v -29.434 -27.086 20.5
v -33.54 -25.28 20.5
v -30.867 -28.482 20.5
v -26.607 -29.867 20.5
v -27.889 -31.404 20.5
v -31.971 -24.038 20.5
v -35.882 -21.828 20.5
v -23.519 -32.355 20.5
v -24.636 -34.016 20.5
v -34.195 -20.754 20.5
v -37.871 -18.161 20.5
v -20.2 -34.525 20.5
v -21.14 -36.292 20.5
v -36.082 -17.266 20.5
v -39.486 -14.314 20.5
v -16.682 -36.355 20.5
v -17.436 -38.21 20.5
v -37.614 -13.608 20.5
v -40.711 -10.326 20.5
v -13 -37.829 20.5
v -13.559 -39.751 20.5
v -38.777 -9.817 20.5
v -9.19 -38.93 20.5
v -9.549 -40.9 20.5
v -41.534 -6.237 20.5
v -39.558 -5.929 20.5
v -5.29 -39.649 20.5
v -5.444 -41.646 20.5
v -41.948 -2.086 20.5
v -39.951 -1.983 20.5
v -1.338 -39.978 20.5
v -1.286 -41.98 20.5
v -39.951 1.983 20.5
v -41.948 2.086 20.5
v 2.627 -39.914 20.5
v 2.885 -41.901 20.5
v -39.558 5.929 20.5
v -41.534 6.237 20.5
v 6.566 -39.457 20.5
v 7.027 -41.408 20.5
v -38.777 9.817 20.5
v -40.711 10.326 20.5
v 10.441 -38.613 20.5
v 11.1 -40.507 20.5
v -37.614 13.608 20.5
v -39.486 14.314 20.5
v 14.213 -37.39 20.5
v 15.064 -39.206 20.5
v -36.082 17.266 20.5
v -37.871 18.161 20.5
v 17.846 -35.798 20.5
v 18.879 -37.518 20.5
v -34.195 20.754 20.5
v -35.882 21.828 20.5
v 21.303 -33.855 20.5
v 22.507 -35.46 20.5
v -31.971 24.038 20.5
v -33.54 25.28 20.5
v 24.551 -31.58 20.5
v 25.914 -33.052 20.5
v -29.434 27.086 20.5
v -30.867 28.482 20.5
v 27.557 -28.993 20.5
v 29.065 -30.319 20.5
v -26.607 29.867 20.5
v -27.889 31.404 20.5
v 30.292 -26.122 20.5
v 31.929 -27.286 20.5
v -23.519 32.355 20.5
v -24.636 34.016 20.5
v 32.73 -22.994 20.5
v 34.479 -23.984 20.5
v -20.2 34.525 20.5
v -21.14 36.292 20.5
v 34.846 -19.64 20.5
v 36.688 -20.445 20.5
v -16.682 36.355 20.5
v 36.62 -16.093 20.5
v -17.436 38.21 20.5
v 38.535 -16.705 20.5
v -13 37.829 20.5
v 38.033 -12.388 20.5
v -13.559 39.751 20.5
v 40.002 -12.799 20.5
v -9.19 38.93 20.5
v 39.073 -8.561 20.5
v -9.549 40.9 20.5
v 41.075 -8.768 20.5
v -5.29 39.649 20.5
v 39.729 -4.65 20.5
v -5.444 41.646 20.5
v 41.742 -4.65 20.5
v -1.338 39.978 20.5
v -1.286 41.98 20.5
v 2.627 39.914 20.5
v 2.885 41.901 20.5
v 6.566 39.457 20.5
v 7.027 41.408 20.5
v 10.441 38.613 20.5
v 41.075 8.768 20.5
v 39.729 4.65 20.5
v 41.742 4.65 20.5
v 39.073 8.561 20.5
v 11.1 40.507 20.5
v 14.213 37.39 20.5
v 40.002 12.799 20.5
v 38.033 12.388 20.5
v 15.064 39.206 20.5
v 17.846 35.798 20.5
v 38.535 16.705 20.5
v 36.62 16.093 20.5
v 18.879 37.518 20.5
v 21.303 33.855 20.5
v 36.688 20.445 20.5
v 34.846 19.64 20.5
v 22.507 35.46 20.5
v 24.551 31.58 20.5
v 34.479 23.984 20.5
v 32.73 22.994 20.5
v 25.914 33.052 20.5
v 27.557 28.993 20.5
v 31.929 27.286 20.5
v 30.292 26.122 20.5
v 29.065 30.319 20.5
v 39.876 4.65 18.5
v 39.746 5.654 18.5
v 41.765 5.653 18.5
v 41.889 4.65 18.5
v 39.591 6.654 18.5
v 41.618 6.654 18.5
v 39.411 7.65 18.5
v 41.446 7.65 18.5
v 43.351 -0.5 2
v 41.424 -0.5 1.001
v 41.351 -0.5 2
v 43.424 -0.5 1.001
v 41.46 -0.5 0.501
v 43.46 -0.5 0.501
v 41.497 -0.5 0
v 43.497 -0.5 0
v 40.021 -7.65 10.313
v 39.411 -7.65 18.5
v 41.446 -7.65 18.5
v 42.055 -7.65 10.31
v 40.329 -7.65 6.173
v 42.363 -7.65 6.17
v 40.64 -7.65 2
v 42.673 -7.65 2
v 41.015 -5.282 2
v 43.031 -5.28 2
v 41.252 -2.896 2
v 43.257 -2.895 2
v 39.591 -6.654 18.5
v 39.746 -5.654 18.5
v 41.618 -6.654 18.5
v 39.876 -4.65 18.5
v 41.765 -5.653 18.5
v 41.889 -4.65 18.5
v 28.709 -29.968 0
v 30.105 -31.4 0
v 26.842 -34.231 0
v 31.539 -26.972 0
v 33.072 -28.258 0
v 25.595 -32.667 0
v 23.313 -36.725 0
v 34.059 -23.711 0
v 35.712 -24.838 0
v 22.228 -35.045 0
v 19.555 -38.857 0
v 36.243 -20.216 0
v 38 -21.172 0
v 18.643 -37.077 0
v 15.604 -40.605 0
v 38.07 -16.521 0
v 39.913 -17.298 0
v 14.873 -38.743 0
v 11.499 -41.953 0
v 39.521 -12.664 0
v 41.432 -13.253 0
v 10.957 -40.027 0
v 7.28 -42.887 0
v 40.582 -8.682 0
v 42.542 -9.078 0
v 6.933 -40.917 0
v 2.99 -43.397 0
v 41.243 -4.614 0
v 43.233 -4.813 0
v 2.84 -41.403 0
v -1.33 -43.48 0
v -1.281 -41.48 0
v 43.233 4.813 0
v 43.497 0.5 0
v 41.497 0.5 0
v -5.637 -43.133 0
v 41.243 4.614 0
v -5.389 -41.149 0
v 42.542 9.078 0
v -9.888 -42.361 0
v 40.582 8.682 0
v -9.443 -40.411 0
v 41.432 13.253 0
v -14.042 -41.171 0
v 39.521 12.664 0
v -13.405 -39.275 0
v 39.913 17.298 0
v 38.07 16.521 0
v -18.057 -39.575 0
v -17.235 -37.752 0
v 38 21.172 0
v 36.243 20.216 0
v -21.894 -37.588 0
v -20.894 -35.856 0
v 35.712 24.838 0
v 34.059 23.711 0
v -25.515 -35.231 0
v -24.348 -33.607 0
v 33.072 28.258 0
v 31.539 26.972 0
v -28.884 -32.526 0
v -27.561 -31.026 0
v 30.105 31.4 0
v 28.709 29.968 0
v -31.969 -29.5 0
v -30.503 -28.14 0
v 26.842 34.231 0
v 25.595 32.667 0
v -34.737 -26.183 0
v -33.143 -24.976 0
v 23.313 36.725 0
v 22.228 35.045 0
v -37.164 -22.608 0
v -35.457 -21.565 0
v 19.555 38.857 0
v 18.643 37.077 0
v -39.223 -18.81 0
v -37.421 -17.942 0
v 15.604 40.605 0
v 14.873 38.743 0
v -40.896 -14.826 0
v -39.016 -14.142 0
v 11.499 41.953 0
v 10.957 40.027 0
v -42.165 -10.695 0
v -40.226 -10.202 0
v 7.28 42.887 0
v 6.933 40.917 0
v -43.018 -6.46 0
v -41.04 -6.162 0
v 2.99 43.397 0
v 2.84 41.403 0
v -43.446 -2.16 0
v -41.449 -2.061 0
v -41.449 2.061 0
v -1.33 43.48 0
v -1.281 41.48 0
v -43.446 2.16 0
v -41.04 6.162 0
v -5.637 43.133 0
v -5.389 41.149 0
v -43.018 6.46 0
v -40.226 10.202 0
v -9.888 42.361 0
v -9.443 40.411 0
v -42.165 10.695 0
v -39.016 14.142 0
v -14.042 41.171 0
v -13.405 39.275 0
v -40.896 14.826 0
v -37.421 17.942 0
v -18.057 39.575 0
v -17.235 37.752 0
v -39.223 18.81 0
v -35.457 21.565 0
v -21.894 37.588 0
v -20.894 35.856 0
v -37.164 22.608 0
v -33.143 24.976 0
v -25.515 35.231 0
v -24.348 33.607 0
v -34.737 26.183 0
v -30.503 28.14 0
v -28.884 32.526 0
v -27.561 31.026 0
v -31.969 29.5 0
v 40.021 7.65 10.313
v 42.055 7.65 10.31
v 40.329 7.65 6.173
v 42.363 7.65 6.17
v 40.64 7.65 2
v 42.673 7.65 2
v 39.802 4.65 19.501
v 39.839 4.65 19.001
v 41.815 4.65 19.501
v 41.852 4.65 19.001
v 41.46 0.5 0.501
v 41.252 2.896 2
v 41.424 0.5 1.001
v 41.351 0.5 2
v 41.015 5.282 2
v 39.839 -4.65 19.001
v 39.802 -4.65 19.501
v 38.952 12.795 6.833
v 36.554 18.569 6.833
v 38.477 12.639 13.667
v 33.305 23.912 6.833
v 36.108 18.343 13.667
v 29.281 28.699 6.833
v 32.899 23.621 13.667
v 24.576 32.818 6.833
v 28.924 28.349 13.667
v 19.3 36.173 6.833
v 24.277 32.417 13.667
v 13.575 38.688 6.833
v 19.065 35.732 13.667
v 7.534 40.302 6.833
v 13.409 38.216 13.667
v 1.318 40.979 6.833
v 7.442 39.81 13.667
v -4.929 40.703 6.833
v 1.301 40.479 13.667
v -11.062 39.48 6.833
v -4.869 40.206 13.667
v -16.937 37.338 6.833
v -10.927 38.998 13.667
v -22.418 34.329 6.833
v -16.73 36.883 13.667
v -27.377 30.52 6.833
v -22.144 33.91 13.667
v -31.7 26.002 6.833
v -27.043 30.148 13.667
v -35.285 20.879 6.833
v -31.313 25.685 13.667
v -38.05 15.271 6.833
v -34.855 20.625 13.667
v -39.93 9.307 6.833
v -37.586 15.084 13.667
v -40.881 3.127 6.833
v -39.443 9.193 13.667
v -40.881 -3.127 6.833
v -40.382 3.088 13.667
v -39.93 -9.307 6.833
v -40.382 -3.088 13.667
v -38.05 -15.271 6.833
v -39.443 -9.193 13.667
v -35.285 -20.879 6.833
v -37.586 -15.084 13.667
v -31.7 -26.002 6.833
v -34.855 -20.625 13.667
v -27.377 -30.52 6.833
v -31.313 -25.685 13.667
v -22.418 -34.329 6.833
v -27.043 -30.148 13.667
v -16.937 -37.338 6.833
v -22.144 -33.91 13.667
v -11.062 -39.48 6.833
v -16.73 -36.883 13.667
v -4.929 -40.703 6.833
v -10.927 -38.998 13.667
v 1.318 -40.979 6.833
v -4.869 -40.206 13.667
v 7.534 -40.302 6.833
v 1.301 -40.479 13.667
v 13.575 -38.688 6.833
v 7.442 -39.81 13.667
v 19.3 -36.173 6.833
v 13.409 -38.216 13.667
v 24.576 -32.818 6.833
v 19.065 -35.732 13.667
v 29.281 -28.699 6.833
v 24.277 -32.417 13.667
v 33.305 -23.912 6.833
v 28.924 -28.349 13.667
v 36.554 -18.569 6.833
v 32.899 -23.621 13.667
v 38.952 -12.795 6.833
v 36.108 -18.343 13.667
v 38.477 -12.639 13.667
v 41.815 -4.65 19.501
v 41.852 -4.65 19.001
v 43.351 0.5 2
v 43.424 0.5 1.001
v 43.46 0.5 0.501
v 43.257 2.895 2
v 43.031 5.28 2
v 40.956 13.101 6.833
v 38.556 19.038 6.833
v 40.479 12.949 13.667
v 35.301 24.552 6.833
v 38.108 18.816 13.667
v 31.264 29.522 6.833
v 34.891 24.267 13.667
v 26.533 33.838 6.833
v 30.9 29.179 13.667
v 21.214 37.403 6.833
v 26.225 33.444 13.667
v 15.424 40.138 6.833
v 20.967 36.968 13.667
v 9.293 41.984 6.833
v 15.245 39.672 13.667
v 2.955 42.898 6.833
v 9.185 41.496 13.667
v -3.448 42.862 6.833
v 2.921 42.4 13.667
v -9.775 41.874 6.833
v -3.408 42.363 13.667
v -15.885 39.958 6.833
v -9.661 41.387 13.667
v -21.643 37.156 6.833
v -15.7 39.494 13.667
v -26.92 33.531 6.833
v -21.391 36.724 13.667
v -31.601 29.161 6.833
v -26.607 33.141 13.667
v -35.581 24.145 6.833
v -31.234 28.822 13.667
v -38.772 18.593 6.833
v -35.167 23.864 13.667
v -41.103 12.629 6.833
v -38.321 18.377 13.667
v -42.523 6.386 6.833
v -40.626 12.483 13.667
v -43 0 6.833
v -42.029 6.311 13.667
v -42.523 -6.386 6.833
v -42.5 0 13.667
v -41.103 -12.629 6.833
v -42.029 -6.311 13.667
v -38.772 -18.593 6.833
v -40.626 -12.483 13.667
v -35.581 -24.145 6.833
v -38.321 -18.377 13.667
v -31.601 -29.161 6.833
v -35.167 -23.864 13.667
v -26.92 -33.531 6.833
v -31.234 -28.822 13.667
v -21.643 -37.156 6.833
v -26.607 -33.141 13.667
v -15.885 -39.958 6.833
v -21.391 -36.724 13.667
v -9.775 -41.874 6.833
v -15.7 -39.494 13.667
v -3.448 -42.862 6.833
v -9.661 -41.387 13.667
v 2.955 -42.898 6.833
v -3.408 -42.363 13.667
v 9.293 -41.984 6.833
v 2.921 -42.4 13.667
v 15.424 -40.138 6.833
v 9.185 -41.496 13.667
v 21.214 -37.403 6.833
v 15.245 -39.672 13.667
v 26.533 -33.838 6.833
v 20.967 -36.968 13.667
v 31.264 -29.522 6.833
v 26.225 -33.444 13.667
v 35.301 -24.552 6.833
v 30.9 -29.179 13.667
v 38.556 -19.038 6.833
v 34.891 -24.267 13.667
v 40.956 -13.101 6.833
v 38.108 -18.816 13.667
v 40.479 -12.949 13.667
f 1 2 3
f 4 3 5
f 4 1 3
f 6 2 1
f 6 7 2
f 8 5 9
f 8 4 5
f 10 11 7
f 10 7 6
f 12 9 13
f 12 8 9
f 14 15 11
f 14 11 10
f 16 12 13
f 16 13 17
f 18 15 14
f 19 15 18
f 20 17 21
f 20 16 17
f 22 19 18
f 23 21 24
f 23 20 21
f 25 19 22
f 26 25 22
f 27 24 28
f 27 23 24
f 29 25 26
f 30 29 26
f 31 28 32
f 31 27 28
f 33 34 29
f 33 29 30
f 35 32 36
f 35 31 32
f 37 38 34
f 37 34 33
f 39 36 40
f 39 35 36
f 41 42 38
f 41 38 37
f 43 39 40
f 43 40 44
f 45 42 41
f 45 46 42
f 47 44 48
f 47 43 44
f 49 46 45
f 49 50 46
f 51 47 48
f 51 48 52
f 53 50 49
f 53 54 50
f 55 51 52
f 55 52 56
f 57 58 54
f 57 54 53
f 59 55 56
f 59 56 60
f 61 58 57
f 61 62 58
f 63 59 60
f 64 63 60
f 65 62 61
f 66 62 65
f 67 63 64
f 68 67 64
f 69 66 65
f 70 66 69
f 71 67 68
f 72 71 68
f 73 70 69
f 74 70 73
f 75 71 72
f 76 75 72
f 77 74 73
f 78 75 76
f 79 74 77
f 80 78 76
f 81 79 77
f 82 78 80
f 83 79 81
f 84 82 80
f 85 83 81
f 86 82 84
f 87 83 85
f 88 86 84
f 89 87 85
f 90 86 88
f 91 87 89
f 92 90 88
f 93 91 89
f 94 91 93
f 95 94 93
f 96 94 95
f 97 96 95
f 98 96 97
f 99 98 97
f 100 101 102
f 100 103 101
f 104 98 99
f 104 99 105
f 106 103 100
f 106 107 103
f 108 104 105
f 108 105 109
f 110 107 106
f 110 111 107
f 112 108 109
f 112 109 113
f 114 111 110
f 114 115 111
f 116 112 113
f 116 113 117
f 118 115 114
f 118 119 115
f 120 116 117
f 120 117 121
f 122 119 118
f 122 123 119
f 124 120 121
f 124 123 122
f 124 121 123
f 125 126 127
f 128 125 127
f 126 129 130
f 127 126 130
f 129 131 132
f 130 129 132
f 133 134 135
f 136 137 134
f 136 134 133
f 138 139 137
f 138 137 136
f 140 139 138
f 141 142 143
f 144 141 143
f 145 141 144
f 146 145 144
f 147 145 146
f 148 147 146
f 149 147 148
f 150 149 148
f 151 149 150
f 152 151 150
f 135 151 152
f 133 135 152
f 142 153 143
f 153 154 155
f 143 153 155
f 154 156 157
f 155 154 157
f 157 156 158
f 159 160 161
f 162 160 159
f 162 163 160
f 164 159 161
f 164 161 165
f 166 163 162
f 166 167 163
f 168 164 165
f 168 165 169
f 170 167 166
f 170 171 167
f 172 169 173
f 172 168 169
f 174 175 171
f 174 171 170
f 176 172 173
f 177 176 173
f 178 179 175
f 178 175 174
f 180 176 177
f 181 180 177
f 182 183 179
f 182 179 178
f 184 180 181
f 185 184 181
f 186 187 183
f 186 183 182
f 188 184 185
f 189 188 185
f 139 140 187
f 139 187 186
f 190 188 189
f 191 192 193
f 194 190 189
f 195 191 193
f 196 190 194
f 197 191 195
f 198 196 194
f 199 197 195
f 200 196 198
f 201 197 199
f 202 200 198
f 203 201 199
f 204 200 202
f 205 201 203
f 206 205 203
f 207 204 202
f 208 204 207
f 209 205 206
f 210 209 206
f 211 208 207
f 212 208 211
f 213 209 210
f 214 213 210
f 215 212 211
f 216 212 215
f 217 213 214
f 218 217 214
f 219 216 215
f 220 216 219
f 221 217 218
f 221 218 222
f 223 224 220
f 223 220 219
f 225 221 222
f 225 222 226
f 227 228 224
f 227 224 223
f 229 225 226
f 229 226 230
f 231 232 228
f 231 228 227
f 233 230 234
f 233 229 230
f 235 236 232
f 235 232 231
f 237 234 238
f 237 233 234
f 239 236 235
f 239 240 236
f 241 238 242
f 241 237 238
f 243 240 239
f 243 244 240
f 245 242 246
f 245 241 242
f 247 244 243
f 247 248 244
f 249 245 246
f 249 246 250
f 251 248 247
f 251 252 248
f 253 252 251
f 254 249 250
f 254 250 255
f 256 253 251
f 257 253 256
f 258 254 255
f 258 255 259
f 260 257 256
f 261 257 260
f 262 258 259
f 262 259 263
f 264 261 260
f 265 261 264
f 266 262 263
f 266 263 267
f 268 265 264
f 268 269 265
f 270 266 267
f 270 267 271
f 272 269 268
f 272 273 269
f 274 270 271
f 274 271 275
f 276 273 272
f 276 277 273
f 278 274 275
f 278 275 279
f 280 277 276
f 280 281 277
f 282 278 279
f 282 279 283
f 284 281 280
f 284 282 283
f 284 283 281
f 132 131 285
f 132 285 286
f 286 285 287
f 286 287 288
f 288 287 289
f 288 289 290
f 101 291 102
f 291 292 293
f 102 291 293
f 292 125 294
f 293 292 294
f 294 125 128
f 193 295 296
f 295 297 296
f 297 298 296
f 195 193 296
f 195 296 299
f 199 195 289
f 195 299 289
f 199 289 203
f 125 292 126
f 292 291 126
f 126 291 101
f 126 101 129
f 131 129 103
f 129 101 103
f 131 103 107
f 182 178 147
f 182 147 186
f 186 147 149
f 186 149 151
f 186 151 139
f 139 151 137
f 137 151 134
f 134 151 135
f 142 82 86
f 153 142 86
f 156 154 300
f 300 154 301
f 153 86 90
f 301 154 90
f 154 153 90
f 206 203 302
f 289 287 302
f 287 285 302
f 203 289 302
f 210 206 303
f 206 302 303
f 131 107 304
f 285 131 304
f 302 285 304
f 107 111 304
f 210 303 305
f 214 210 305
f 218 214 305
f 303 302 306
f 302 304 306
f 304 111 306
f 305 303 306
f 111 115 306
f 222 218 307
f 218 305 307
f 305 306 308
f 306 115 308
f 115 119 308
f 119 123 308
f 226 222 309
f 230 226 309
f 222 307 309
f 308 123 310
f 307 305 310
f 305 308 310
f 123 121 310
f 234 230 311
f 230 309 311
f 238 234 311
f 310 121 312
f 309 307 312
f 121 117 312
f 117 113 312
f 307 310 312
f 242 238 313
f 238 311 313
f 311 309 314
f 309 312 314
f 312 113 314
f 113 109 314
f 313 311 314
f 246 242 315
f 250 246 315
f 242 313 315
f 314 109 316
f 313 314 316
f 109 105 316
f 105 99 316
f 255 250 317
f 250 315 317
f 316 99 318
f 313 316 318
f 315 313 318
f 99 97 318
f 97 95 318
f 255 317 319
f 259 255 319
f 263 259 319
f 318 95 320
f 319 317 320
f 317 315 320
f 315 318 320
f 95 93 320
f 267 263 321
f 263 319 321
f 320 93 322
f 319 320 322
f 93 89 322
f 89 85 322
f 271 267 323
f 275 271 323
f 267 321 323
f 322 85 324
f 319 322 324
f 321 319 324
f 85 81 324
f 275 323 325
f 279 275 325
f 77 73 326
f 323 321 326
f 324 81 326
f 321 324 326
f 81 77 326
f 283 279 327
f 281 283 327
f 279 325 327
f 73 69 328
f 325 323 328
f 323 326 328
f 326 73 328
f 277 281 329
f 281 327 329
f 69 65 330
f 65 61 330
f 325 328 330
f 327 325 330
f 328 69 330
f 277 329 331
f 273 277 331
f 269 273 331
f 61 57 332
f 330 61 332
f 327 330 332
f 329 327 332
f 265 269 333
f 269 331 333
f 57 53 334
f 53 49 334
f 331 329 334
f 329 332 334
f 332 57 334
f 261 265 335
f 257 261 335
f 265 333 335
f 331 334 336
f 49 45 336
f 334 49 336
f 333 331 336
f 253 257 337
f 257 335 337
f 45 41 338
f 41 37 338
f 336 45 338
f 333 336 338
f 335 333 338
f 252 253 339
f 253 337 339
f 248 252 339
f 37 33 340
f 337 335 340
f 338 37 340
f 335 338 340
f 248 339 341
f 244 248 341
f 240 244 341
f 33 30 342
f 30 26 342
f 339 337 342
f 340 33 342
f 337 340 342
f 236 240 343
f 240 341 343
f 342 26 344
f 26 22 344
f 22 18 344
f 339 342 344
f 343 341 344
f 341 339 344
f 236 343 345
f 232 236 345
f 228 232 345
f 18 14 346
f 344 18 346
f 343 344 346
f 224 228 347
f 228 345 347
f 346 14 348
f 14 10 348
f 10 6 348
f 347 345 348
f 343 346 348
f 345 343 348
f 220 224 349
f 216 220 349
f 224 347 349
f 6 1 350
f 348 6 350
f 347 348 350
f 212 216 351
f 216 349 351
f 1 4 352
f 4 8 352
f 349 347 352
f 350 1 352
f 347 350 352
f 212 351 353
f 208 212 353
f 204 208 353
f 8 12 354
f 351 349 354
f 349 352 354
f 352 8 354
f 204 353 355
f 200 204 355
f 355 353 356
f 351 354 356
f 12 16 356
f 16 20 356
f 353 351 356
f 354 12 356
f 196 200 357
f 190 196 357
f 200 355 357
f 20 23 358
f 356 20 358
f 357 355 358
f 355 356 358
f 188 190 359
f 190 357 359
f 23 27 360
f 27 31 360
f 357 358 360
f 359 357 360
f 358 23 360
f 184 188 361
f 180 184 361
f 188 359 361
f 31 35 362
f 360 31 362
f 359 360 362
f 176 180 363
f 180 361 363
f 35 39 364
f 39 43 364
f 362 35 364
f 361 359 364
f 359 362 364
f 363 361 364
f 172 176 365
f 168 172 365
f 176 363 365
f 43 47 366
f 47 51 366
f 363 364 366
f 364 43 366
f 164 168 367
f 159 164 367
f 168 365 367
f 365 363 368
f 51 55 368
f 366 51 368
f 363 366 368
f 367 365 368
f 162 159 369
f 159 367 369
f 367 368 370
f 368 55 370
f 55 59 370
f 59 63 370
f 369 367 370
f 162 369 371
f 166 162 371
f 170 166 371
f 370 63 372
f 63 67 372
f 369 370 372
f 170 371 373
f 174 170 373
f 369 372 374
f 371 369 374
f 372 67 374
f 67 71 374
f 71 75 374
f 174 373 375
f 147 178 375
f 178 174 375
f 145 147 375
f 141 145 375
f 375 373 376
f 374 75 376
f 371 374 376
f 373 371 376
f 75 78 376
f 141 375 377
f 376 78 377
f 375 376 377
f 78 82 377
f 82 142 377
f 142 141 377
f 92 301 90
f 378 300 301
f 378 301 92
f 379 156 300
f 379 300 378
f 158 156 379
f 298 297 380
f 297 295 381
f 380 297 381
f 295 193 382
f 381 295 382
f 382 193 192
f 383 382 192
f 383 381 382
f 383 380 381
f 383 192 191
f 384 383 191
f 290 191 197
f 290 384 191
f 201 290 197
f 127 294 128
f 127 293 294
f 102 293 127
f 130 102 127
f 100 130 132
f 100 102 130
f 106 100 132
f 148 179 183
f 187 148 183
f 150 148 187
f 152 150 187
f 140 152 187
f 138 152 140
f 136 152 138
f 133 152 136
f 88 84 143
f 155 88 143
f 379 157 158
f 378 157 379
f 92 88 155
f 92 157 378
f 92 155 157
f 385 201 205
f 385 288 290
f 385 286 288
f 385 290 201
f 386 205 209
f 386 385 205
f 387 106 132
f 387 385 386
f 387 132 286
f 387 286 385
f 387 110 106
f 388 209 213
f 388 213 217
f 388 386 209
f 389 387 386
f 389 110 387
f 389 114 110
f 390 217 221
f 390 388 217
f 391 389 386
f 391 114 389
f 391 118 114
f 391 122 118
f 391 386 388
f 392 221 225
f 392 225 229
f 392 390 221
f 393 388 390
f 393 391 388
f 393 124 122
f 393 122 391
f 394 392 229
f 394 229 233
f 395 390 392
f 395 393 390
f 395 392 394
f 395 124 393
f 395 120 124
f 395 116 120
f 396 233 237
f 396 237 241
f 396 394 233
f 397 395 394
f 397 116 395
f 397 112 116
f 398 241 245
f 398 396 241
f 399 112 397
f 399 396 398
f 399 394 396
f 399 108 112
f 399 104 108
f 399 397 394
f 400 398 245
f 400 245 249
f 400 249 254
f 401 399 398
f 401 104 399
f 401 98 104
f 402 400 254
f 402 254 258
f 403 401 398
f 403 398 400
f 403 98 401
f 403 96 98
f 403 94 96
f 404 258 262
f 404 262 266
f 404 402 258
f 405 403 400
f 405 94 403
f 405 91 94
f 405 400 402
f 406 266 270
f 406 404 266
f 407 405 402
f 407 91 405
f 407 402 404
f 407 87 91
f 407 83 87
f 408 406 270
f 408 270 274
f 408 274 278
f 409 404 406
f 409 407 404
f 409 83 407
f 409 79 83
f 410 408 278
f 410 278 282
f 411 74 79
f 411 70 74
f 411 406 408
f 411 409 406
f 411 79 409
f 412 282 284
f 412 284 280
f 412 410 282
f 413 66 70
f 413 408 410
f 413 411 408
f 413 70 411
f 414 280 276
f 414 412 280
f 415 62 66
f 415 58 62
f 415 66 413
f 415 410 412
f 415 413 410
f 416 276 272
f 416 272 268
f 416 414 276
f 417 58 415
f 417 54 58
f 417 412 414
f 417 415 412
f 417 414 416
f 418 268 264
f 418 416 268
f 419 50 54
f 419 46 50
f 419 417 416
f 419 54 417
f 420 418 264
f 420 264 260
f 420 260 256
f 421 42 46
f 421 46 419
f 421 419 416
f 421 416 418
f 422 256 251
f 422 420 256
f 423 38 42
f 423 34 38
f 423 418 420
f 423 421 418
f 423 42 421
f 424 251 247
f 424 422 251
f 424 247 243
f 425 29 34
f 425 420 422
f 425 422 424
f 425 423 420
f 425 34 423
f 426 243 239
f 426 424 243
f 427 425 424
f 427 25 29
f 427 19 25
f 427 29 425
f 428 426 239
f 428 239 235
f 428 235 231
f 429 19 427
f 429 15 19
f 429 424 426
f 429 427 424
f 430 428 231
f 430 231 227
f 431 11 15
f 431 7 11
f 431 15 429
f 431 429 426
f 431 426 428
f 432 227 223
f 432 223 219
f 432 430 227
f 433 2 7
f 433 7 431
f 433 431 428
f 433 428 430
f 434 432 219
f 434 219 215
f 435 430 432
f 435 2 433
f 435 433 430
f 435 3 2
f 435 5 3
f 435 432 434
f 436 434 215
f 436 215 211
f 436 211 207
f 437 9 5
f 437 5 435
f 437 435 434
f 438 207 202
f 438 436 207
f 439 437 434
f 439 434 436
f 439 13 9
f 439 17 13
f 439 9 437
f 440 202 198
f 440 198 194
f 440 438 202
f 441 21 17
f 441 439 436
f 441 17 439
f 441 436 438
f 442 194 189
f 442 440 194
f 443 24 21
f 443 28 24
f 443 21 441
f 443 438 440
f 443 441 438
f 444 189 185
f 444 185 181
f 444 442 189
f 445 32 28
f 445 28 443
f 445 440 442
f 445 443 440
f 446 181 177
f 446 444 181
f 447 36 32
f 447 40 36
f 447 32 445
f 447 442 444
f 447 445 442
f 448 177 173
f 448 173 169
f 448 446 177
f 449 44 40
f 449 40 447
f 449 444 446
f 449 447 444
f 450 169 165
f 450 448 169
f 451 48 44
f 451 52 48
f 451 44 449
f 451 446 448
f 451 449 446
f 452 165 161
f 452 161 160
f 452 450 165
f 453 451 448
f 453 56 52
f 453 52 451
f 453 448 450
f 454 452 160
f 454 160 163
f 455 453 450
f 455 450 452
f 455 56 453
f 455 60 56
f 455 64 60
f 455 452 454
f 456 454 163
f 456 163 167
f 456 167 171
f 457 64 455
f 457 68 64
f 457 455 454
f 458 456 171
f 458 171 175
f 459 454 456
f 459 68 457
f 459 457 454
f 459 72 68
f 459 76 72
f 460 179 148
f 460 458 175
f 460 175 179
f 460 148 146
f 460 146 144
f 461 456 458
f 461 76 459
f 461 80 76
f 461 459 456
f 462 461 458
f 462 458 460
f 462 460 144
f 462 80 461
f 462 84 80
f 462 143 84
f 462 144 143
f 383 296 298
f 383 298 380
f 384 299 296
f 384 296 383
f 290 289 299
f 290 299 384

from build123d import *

# Parameters (mm, degrees)
BOX013_W     = 30
BOX013_H     = 9.3
BOX013_DEPTH = 25.5
BOX012_W     = 30
BOX012_H     = 15.3
BOX012_DEPTH = 16.5
BOX014_W     = 30
BOX014_H     = 1
BOX014_DEPTH = 25.5


with BuildPart() as cube013:
    # Box013 → Box013 (new body)
    with BuildSketch(Plane(origin=(24, -4.65, 2), x_dir=(1, 0, 0), z_dir=(0, 0, 1))):
        with Locations((15, 4.65)):
            Rectangle(BOX013_W, BOX013_H)
    extrude(amount=BOX013_DEPTH)


with BuildPart() as cube012:
    # Box012 → Box012 (new body)
    with BuildSketch(Plane(origin=(24, -7.65, 2), x_dir=(1, 0, 0), z_dir=(0, 0, 1))):
        with Locations((15, 7.65)):
            Rectangle(BOX012_W, BOX012_H)
    extrude(amount=BOX012_DEPTH)


with BuildPart() as cortador004:
    # Box014 → Box014 (new body)
    with BuildSketch(Plane(origin=(24, -0.5, -2), x_dir=(1, 0, 0), z_dir=(0, 0, 1))):
        with Locations((15, 0.5)):
            Rectangle(BOX014_W, BOX014_H)
    extrude(amount=BOX014_DEPTH)

    # Fusion006: union Cube013, Cube012
    add(cube013.part)
    add(cube012.part)


with BuildPart() as cone_chico:
    # Cone → Cone (revolve)
    with BuildSketch(Plane.XZ):
        Polygon((0, 0), (41.5, 0), (40, 20.5), (0, 20.5), align=None)
    revolve(axis=Axis((0, 0, 0), (0, 0, 1)))


with BuildPart() as taza_te_interior2:
    # Cone001 → Cone001 (revolve)
    with BuildSketch(Plane.XZ):
        Polygon((0, 0), (43.5, 0), (42, 20.5), (0, 20.5), align=None)
    revolve(axis=Axis((0, 0, 0), (0, 0, 1)))

    # Cut015014: cut Cone_chico
    add(cone_chico.part, mode=Mode.SUBTRACT)

    # Cut015027: cut cortador004
    add(cortador004.part, mode=Mode.SUBTRACT)


solid = taza_te_interior2.part
